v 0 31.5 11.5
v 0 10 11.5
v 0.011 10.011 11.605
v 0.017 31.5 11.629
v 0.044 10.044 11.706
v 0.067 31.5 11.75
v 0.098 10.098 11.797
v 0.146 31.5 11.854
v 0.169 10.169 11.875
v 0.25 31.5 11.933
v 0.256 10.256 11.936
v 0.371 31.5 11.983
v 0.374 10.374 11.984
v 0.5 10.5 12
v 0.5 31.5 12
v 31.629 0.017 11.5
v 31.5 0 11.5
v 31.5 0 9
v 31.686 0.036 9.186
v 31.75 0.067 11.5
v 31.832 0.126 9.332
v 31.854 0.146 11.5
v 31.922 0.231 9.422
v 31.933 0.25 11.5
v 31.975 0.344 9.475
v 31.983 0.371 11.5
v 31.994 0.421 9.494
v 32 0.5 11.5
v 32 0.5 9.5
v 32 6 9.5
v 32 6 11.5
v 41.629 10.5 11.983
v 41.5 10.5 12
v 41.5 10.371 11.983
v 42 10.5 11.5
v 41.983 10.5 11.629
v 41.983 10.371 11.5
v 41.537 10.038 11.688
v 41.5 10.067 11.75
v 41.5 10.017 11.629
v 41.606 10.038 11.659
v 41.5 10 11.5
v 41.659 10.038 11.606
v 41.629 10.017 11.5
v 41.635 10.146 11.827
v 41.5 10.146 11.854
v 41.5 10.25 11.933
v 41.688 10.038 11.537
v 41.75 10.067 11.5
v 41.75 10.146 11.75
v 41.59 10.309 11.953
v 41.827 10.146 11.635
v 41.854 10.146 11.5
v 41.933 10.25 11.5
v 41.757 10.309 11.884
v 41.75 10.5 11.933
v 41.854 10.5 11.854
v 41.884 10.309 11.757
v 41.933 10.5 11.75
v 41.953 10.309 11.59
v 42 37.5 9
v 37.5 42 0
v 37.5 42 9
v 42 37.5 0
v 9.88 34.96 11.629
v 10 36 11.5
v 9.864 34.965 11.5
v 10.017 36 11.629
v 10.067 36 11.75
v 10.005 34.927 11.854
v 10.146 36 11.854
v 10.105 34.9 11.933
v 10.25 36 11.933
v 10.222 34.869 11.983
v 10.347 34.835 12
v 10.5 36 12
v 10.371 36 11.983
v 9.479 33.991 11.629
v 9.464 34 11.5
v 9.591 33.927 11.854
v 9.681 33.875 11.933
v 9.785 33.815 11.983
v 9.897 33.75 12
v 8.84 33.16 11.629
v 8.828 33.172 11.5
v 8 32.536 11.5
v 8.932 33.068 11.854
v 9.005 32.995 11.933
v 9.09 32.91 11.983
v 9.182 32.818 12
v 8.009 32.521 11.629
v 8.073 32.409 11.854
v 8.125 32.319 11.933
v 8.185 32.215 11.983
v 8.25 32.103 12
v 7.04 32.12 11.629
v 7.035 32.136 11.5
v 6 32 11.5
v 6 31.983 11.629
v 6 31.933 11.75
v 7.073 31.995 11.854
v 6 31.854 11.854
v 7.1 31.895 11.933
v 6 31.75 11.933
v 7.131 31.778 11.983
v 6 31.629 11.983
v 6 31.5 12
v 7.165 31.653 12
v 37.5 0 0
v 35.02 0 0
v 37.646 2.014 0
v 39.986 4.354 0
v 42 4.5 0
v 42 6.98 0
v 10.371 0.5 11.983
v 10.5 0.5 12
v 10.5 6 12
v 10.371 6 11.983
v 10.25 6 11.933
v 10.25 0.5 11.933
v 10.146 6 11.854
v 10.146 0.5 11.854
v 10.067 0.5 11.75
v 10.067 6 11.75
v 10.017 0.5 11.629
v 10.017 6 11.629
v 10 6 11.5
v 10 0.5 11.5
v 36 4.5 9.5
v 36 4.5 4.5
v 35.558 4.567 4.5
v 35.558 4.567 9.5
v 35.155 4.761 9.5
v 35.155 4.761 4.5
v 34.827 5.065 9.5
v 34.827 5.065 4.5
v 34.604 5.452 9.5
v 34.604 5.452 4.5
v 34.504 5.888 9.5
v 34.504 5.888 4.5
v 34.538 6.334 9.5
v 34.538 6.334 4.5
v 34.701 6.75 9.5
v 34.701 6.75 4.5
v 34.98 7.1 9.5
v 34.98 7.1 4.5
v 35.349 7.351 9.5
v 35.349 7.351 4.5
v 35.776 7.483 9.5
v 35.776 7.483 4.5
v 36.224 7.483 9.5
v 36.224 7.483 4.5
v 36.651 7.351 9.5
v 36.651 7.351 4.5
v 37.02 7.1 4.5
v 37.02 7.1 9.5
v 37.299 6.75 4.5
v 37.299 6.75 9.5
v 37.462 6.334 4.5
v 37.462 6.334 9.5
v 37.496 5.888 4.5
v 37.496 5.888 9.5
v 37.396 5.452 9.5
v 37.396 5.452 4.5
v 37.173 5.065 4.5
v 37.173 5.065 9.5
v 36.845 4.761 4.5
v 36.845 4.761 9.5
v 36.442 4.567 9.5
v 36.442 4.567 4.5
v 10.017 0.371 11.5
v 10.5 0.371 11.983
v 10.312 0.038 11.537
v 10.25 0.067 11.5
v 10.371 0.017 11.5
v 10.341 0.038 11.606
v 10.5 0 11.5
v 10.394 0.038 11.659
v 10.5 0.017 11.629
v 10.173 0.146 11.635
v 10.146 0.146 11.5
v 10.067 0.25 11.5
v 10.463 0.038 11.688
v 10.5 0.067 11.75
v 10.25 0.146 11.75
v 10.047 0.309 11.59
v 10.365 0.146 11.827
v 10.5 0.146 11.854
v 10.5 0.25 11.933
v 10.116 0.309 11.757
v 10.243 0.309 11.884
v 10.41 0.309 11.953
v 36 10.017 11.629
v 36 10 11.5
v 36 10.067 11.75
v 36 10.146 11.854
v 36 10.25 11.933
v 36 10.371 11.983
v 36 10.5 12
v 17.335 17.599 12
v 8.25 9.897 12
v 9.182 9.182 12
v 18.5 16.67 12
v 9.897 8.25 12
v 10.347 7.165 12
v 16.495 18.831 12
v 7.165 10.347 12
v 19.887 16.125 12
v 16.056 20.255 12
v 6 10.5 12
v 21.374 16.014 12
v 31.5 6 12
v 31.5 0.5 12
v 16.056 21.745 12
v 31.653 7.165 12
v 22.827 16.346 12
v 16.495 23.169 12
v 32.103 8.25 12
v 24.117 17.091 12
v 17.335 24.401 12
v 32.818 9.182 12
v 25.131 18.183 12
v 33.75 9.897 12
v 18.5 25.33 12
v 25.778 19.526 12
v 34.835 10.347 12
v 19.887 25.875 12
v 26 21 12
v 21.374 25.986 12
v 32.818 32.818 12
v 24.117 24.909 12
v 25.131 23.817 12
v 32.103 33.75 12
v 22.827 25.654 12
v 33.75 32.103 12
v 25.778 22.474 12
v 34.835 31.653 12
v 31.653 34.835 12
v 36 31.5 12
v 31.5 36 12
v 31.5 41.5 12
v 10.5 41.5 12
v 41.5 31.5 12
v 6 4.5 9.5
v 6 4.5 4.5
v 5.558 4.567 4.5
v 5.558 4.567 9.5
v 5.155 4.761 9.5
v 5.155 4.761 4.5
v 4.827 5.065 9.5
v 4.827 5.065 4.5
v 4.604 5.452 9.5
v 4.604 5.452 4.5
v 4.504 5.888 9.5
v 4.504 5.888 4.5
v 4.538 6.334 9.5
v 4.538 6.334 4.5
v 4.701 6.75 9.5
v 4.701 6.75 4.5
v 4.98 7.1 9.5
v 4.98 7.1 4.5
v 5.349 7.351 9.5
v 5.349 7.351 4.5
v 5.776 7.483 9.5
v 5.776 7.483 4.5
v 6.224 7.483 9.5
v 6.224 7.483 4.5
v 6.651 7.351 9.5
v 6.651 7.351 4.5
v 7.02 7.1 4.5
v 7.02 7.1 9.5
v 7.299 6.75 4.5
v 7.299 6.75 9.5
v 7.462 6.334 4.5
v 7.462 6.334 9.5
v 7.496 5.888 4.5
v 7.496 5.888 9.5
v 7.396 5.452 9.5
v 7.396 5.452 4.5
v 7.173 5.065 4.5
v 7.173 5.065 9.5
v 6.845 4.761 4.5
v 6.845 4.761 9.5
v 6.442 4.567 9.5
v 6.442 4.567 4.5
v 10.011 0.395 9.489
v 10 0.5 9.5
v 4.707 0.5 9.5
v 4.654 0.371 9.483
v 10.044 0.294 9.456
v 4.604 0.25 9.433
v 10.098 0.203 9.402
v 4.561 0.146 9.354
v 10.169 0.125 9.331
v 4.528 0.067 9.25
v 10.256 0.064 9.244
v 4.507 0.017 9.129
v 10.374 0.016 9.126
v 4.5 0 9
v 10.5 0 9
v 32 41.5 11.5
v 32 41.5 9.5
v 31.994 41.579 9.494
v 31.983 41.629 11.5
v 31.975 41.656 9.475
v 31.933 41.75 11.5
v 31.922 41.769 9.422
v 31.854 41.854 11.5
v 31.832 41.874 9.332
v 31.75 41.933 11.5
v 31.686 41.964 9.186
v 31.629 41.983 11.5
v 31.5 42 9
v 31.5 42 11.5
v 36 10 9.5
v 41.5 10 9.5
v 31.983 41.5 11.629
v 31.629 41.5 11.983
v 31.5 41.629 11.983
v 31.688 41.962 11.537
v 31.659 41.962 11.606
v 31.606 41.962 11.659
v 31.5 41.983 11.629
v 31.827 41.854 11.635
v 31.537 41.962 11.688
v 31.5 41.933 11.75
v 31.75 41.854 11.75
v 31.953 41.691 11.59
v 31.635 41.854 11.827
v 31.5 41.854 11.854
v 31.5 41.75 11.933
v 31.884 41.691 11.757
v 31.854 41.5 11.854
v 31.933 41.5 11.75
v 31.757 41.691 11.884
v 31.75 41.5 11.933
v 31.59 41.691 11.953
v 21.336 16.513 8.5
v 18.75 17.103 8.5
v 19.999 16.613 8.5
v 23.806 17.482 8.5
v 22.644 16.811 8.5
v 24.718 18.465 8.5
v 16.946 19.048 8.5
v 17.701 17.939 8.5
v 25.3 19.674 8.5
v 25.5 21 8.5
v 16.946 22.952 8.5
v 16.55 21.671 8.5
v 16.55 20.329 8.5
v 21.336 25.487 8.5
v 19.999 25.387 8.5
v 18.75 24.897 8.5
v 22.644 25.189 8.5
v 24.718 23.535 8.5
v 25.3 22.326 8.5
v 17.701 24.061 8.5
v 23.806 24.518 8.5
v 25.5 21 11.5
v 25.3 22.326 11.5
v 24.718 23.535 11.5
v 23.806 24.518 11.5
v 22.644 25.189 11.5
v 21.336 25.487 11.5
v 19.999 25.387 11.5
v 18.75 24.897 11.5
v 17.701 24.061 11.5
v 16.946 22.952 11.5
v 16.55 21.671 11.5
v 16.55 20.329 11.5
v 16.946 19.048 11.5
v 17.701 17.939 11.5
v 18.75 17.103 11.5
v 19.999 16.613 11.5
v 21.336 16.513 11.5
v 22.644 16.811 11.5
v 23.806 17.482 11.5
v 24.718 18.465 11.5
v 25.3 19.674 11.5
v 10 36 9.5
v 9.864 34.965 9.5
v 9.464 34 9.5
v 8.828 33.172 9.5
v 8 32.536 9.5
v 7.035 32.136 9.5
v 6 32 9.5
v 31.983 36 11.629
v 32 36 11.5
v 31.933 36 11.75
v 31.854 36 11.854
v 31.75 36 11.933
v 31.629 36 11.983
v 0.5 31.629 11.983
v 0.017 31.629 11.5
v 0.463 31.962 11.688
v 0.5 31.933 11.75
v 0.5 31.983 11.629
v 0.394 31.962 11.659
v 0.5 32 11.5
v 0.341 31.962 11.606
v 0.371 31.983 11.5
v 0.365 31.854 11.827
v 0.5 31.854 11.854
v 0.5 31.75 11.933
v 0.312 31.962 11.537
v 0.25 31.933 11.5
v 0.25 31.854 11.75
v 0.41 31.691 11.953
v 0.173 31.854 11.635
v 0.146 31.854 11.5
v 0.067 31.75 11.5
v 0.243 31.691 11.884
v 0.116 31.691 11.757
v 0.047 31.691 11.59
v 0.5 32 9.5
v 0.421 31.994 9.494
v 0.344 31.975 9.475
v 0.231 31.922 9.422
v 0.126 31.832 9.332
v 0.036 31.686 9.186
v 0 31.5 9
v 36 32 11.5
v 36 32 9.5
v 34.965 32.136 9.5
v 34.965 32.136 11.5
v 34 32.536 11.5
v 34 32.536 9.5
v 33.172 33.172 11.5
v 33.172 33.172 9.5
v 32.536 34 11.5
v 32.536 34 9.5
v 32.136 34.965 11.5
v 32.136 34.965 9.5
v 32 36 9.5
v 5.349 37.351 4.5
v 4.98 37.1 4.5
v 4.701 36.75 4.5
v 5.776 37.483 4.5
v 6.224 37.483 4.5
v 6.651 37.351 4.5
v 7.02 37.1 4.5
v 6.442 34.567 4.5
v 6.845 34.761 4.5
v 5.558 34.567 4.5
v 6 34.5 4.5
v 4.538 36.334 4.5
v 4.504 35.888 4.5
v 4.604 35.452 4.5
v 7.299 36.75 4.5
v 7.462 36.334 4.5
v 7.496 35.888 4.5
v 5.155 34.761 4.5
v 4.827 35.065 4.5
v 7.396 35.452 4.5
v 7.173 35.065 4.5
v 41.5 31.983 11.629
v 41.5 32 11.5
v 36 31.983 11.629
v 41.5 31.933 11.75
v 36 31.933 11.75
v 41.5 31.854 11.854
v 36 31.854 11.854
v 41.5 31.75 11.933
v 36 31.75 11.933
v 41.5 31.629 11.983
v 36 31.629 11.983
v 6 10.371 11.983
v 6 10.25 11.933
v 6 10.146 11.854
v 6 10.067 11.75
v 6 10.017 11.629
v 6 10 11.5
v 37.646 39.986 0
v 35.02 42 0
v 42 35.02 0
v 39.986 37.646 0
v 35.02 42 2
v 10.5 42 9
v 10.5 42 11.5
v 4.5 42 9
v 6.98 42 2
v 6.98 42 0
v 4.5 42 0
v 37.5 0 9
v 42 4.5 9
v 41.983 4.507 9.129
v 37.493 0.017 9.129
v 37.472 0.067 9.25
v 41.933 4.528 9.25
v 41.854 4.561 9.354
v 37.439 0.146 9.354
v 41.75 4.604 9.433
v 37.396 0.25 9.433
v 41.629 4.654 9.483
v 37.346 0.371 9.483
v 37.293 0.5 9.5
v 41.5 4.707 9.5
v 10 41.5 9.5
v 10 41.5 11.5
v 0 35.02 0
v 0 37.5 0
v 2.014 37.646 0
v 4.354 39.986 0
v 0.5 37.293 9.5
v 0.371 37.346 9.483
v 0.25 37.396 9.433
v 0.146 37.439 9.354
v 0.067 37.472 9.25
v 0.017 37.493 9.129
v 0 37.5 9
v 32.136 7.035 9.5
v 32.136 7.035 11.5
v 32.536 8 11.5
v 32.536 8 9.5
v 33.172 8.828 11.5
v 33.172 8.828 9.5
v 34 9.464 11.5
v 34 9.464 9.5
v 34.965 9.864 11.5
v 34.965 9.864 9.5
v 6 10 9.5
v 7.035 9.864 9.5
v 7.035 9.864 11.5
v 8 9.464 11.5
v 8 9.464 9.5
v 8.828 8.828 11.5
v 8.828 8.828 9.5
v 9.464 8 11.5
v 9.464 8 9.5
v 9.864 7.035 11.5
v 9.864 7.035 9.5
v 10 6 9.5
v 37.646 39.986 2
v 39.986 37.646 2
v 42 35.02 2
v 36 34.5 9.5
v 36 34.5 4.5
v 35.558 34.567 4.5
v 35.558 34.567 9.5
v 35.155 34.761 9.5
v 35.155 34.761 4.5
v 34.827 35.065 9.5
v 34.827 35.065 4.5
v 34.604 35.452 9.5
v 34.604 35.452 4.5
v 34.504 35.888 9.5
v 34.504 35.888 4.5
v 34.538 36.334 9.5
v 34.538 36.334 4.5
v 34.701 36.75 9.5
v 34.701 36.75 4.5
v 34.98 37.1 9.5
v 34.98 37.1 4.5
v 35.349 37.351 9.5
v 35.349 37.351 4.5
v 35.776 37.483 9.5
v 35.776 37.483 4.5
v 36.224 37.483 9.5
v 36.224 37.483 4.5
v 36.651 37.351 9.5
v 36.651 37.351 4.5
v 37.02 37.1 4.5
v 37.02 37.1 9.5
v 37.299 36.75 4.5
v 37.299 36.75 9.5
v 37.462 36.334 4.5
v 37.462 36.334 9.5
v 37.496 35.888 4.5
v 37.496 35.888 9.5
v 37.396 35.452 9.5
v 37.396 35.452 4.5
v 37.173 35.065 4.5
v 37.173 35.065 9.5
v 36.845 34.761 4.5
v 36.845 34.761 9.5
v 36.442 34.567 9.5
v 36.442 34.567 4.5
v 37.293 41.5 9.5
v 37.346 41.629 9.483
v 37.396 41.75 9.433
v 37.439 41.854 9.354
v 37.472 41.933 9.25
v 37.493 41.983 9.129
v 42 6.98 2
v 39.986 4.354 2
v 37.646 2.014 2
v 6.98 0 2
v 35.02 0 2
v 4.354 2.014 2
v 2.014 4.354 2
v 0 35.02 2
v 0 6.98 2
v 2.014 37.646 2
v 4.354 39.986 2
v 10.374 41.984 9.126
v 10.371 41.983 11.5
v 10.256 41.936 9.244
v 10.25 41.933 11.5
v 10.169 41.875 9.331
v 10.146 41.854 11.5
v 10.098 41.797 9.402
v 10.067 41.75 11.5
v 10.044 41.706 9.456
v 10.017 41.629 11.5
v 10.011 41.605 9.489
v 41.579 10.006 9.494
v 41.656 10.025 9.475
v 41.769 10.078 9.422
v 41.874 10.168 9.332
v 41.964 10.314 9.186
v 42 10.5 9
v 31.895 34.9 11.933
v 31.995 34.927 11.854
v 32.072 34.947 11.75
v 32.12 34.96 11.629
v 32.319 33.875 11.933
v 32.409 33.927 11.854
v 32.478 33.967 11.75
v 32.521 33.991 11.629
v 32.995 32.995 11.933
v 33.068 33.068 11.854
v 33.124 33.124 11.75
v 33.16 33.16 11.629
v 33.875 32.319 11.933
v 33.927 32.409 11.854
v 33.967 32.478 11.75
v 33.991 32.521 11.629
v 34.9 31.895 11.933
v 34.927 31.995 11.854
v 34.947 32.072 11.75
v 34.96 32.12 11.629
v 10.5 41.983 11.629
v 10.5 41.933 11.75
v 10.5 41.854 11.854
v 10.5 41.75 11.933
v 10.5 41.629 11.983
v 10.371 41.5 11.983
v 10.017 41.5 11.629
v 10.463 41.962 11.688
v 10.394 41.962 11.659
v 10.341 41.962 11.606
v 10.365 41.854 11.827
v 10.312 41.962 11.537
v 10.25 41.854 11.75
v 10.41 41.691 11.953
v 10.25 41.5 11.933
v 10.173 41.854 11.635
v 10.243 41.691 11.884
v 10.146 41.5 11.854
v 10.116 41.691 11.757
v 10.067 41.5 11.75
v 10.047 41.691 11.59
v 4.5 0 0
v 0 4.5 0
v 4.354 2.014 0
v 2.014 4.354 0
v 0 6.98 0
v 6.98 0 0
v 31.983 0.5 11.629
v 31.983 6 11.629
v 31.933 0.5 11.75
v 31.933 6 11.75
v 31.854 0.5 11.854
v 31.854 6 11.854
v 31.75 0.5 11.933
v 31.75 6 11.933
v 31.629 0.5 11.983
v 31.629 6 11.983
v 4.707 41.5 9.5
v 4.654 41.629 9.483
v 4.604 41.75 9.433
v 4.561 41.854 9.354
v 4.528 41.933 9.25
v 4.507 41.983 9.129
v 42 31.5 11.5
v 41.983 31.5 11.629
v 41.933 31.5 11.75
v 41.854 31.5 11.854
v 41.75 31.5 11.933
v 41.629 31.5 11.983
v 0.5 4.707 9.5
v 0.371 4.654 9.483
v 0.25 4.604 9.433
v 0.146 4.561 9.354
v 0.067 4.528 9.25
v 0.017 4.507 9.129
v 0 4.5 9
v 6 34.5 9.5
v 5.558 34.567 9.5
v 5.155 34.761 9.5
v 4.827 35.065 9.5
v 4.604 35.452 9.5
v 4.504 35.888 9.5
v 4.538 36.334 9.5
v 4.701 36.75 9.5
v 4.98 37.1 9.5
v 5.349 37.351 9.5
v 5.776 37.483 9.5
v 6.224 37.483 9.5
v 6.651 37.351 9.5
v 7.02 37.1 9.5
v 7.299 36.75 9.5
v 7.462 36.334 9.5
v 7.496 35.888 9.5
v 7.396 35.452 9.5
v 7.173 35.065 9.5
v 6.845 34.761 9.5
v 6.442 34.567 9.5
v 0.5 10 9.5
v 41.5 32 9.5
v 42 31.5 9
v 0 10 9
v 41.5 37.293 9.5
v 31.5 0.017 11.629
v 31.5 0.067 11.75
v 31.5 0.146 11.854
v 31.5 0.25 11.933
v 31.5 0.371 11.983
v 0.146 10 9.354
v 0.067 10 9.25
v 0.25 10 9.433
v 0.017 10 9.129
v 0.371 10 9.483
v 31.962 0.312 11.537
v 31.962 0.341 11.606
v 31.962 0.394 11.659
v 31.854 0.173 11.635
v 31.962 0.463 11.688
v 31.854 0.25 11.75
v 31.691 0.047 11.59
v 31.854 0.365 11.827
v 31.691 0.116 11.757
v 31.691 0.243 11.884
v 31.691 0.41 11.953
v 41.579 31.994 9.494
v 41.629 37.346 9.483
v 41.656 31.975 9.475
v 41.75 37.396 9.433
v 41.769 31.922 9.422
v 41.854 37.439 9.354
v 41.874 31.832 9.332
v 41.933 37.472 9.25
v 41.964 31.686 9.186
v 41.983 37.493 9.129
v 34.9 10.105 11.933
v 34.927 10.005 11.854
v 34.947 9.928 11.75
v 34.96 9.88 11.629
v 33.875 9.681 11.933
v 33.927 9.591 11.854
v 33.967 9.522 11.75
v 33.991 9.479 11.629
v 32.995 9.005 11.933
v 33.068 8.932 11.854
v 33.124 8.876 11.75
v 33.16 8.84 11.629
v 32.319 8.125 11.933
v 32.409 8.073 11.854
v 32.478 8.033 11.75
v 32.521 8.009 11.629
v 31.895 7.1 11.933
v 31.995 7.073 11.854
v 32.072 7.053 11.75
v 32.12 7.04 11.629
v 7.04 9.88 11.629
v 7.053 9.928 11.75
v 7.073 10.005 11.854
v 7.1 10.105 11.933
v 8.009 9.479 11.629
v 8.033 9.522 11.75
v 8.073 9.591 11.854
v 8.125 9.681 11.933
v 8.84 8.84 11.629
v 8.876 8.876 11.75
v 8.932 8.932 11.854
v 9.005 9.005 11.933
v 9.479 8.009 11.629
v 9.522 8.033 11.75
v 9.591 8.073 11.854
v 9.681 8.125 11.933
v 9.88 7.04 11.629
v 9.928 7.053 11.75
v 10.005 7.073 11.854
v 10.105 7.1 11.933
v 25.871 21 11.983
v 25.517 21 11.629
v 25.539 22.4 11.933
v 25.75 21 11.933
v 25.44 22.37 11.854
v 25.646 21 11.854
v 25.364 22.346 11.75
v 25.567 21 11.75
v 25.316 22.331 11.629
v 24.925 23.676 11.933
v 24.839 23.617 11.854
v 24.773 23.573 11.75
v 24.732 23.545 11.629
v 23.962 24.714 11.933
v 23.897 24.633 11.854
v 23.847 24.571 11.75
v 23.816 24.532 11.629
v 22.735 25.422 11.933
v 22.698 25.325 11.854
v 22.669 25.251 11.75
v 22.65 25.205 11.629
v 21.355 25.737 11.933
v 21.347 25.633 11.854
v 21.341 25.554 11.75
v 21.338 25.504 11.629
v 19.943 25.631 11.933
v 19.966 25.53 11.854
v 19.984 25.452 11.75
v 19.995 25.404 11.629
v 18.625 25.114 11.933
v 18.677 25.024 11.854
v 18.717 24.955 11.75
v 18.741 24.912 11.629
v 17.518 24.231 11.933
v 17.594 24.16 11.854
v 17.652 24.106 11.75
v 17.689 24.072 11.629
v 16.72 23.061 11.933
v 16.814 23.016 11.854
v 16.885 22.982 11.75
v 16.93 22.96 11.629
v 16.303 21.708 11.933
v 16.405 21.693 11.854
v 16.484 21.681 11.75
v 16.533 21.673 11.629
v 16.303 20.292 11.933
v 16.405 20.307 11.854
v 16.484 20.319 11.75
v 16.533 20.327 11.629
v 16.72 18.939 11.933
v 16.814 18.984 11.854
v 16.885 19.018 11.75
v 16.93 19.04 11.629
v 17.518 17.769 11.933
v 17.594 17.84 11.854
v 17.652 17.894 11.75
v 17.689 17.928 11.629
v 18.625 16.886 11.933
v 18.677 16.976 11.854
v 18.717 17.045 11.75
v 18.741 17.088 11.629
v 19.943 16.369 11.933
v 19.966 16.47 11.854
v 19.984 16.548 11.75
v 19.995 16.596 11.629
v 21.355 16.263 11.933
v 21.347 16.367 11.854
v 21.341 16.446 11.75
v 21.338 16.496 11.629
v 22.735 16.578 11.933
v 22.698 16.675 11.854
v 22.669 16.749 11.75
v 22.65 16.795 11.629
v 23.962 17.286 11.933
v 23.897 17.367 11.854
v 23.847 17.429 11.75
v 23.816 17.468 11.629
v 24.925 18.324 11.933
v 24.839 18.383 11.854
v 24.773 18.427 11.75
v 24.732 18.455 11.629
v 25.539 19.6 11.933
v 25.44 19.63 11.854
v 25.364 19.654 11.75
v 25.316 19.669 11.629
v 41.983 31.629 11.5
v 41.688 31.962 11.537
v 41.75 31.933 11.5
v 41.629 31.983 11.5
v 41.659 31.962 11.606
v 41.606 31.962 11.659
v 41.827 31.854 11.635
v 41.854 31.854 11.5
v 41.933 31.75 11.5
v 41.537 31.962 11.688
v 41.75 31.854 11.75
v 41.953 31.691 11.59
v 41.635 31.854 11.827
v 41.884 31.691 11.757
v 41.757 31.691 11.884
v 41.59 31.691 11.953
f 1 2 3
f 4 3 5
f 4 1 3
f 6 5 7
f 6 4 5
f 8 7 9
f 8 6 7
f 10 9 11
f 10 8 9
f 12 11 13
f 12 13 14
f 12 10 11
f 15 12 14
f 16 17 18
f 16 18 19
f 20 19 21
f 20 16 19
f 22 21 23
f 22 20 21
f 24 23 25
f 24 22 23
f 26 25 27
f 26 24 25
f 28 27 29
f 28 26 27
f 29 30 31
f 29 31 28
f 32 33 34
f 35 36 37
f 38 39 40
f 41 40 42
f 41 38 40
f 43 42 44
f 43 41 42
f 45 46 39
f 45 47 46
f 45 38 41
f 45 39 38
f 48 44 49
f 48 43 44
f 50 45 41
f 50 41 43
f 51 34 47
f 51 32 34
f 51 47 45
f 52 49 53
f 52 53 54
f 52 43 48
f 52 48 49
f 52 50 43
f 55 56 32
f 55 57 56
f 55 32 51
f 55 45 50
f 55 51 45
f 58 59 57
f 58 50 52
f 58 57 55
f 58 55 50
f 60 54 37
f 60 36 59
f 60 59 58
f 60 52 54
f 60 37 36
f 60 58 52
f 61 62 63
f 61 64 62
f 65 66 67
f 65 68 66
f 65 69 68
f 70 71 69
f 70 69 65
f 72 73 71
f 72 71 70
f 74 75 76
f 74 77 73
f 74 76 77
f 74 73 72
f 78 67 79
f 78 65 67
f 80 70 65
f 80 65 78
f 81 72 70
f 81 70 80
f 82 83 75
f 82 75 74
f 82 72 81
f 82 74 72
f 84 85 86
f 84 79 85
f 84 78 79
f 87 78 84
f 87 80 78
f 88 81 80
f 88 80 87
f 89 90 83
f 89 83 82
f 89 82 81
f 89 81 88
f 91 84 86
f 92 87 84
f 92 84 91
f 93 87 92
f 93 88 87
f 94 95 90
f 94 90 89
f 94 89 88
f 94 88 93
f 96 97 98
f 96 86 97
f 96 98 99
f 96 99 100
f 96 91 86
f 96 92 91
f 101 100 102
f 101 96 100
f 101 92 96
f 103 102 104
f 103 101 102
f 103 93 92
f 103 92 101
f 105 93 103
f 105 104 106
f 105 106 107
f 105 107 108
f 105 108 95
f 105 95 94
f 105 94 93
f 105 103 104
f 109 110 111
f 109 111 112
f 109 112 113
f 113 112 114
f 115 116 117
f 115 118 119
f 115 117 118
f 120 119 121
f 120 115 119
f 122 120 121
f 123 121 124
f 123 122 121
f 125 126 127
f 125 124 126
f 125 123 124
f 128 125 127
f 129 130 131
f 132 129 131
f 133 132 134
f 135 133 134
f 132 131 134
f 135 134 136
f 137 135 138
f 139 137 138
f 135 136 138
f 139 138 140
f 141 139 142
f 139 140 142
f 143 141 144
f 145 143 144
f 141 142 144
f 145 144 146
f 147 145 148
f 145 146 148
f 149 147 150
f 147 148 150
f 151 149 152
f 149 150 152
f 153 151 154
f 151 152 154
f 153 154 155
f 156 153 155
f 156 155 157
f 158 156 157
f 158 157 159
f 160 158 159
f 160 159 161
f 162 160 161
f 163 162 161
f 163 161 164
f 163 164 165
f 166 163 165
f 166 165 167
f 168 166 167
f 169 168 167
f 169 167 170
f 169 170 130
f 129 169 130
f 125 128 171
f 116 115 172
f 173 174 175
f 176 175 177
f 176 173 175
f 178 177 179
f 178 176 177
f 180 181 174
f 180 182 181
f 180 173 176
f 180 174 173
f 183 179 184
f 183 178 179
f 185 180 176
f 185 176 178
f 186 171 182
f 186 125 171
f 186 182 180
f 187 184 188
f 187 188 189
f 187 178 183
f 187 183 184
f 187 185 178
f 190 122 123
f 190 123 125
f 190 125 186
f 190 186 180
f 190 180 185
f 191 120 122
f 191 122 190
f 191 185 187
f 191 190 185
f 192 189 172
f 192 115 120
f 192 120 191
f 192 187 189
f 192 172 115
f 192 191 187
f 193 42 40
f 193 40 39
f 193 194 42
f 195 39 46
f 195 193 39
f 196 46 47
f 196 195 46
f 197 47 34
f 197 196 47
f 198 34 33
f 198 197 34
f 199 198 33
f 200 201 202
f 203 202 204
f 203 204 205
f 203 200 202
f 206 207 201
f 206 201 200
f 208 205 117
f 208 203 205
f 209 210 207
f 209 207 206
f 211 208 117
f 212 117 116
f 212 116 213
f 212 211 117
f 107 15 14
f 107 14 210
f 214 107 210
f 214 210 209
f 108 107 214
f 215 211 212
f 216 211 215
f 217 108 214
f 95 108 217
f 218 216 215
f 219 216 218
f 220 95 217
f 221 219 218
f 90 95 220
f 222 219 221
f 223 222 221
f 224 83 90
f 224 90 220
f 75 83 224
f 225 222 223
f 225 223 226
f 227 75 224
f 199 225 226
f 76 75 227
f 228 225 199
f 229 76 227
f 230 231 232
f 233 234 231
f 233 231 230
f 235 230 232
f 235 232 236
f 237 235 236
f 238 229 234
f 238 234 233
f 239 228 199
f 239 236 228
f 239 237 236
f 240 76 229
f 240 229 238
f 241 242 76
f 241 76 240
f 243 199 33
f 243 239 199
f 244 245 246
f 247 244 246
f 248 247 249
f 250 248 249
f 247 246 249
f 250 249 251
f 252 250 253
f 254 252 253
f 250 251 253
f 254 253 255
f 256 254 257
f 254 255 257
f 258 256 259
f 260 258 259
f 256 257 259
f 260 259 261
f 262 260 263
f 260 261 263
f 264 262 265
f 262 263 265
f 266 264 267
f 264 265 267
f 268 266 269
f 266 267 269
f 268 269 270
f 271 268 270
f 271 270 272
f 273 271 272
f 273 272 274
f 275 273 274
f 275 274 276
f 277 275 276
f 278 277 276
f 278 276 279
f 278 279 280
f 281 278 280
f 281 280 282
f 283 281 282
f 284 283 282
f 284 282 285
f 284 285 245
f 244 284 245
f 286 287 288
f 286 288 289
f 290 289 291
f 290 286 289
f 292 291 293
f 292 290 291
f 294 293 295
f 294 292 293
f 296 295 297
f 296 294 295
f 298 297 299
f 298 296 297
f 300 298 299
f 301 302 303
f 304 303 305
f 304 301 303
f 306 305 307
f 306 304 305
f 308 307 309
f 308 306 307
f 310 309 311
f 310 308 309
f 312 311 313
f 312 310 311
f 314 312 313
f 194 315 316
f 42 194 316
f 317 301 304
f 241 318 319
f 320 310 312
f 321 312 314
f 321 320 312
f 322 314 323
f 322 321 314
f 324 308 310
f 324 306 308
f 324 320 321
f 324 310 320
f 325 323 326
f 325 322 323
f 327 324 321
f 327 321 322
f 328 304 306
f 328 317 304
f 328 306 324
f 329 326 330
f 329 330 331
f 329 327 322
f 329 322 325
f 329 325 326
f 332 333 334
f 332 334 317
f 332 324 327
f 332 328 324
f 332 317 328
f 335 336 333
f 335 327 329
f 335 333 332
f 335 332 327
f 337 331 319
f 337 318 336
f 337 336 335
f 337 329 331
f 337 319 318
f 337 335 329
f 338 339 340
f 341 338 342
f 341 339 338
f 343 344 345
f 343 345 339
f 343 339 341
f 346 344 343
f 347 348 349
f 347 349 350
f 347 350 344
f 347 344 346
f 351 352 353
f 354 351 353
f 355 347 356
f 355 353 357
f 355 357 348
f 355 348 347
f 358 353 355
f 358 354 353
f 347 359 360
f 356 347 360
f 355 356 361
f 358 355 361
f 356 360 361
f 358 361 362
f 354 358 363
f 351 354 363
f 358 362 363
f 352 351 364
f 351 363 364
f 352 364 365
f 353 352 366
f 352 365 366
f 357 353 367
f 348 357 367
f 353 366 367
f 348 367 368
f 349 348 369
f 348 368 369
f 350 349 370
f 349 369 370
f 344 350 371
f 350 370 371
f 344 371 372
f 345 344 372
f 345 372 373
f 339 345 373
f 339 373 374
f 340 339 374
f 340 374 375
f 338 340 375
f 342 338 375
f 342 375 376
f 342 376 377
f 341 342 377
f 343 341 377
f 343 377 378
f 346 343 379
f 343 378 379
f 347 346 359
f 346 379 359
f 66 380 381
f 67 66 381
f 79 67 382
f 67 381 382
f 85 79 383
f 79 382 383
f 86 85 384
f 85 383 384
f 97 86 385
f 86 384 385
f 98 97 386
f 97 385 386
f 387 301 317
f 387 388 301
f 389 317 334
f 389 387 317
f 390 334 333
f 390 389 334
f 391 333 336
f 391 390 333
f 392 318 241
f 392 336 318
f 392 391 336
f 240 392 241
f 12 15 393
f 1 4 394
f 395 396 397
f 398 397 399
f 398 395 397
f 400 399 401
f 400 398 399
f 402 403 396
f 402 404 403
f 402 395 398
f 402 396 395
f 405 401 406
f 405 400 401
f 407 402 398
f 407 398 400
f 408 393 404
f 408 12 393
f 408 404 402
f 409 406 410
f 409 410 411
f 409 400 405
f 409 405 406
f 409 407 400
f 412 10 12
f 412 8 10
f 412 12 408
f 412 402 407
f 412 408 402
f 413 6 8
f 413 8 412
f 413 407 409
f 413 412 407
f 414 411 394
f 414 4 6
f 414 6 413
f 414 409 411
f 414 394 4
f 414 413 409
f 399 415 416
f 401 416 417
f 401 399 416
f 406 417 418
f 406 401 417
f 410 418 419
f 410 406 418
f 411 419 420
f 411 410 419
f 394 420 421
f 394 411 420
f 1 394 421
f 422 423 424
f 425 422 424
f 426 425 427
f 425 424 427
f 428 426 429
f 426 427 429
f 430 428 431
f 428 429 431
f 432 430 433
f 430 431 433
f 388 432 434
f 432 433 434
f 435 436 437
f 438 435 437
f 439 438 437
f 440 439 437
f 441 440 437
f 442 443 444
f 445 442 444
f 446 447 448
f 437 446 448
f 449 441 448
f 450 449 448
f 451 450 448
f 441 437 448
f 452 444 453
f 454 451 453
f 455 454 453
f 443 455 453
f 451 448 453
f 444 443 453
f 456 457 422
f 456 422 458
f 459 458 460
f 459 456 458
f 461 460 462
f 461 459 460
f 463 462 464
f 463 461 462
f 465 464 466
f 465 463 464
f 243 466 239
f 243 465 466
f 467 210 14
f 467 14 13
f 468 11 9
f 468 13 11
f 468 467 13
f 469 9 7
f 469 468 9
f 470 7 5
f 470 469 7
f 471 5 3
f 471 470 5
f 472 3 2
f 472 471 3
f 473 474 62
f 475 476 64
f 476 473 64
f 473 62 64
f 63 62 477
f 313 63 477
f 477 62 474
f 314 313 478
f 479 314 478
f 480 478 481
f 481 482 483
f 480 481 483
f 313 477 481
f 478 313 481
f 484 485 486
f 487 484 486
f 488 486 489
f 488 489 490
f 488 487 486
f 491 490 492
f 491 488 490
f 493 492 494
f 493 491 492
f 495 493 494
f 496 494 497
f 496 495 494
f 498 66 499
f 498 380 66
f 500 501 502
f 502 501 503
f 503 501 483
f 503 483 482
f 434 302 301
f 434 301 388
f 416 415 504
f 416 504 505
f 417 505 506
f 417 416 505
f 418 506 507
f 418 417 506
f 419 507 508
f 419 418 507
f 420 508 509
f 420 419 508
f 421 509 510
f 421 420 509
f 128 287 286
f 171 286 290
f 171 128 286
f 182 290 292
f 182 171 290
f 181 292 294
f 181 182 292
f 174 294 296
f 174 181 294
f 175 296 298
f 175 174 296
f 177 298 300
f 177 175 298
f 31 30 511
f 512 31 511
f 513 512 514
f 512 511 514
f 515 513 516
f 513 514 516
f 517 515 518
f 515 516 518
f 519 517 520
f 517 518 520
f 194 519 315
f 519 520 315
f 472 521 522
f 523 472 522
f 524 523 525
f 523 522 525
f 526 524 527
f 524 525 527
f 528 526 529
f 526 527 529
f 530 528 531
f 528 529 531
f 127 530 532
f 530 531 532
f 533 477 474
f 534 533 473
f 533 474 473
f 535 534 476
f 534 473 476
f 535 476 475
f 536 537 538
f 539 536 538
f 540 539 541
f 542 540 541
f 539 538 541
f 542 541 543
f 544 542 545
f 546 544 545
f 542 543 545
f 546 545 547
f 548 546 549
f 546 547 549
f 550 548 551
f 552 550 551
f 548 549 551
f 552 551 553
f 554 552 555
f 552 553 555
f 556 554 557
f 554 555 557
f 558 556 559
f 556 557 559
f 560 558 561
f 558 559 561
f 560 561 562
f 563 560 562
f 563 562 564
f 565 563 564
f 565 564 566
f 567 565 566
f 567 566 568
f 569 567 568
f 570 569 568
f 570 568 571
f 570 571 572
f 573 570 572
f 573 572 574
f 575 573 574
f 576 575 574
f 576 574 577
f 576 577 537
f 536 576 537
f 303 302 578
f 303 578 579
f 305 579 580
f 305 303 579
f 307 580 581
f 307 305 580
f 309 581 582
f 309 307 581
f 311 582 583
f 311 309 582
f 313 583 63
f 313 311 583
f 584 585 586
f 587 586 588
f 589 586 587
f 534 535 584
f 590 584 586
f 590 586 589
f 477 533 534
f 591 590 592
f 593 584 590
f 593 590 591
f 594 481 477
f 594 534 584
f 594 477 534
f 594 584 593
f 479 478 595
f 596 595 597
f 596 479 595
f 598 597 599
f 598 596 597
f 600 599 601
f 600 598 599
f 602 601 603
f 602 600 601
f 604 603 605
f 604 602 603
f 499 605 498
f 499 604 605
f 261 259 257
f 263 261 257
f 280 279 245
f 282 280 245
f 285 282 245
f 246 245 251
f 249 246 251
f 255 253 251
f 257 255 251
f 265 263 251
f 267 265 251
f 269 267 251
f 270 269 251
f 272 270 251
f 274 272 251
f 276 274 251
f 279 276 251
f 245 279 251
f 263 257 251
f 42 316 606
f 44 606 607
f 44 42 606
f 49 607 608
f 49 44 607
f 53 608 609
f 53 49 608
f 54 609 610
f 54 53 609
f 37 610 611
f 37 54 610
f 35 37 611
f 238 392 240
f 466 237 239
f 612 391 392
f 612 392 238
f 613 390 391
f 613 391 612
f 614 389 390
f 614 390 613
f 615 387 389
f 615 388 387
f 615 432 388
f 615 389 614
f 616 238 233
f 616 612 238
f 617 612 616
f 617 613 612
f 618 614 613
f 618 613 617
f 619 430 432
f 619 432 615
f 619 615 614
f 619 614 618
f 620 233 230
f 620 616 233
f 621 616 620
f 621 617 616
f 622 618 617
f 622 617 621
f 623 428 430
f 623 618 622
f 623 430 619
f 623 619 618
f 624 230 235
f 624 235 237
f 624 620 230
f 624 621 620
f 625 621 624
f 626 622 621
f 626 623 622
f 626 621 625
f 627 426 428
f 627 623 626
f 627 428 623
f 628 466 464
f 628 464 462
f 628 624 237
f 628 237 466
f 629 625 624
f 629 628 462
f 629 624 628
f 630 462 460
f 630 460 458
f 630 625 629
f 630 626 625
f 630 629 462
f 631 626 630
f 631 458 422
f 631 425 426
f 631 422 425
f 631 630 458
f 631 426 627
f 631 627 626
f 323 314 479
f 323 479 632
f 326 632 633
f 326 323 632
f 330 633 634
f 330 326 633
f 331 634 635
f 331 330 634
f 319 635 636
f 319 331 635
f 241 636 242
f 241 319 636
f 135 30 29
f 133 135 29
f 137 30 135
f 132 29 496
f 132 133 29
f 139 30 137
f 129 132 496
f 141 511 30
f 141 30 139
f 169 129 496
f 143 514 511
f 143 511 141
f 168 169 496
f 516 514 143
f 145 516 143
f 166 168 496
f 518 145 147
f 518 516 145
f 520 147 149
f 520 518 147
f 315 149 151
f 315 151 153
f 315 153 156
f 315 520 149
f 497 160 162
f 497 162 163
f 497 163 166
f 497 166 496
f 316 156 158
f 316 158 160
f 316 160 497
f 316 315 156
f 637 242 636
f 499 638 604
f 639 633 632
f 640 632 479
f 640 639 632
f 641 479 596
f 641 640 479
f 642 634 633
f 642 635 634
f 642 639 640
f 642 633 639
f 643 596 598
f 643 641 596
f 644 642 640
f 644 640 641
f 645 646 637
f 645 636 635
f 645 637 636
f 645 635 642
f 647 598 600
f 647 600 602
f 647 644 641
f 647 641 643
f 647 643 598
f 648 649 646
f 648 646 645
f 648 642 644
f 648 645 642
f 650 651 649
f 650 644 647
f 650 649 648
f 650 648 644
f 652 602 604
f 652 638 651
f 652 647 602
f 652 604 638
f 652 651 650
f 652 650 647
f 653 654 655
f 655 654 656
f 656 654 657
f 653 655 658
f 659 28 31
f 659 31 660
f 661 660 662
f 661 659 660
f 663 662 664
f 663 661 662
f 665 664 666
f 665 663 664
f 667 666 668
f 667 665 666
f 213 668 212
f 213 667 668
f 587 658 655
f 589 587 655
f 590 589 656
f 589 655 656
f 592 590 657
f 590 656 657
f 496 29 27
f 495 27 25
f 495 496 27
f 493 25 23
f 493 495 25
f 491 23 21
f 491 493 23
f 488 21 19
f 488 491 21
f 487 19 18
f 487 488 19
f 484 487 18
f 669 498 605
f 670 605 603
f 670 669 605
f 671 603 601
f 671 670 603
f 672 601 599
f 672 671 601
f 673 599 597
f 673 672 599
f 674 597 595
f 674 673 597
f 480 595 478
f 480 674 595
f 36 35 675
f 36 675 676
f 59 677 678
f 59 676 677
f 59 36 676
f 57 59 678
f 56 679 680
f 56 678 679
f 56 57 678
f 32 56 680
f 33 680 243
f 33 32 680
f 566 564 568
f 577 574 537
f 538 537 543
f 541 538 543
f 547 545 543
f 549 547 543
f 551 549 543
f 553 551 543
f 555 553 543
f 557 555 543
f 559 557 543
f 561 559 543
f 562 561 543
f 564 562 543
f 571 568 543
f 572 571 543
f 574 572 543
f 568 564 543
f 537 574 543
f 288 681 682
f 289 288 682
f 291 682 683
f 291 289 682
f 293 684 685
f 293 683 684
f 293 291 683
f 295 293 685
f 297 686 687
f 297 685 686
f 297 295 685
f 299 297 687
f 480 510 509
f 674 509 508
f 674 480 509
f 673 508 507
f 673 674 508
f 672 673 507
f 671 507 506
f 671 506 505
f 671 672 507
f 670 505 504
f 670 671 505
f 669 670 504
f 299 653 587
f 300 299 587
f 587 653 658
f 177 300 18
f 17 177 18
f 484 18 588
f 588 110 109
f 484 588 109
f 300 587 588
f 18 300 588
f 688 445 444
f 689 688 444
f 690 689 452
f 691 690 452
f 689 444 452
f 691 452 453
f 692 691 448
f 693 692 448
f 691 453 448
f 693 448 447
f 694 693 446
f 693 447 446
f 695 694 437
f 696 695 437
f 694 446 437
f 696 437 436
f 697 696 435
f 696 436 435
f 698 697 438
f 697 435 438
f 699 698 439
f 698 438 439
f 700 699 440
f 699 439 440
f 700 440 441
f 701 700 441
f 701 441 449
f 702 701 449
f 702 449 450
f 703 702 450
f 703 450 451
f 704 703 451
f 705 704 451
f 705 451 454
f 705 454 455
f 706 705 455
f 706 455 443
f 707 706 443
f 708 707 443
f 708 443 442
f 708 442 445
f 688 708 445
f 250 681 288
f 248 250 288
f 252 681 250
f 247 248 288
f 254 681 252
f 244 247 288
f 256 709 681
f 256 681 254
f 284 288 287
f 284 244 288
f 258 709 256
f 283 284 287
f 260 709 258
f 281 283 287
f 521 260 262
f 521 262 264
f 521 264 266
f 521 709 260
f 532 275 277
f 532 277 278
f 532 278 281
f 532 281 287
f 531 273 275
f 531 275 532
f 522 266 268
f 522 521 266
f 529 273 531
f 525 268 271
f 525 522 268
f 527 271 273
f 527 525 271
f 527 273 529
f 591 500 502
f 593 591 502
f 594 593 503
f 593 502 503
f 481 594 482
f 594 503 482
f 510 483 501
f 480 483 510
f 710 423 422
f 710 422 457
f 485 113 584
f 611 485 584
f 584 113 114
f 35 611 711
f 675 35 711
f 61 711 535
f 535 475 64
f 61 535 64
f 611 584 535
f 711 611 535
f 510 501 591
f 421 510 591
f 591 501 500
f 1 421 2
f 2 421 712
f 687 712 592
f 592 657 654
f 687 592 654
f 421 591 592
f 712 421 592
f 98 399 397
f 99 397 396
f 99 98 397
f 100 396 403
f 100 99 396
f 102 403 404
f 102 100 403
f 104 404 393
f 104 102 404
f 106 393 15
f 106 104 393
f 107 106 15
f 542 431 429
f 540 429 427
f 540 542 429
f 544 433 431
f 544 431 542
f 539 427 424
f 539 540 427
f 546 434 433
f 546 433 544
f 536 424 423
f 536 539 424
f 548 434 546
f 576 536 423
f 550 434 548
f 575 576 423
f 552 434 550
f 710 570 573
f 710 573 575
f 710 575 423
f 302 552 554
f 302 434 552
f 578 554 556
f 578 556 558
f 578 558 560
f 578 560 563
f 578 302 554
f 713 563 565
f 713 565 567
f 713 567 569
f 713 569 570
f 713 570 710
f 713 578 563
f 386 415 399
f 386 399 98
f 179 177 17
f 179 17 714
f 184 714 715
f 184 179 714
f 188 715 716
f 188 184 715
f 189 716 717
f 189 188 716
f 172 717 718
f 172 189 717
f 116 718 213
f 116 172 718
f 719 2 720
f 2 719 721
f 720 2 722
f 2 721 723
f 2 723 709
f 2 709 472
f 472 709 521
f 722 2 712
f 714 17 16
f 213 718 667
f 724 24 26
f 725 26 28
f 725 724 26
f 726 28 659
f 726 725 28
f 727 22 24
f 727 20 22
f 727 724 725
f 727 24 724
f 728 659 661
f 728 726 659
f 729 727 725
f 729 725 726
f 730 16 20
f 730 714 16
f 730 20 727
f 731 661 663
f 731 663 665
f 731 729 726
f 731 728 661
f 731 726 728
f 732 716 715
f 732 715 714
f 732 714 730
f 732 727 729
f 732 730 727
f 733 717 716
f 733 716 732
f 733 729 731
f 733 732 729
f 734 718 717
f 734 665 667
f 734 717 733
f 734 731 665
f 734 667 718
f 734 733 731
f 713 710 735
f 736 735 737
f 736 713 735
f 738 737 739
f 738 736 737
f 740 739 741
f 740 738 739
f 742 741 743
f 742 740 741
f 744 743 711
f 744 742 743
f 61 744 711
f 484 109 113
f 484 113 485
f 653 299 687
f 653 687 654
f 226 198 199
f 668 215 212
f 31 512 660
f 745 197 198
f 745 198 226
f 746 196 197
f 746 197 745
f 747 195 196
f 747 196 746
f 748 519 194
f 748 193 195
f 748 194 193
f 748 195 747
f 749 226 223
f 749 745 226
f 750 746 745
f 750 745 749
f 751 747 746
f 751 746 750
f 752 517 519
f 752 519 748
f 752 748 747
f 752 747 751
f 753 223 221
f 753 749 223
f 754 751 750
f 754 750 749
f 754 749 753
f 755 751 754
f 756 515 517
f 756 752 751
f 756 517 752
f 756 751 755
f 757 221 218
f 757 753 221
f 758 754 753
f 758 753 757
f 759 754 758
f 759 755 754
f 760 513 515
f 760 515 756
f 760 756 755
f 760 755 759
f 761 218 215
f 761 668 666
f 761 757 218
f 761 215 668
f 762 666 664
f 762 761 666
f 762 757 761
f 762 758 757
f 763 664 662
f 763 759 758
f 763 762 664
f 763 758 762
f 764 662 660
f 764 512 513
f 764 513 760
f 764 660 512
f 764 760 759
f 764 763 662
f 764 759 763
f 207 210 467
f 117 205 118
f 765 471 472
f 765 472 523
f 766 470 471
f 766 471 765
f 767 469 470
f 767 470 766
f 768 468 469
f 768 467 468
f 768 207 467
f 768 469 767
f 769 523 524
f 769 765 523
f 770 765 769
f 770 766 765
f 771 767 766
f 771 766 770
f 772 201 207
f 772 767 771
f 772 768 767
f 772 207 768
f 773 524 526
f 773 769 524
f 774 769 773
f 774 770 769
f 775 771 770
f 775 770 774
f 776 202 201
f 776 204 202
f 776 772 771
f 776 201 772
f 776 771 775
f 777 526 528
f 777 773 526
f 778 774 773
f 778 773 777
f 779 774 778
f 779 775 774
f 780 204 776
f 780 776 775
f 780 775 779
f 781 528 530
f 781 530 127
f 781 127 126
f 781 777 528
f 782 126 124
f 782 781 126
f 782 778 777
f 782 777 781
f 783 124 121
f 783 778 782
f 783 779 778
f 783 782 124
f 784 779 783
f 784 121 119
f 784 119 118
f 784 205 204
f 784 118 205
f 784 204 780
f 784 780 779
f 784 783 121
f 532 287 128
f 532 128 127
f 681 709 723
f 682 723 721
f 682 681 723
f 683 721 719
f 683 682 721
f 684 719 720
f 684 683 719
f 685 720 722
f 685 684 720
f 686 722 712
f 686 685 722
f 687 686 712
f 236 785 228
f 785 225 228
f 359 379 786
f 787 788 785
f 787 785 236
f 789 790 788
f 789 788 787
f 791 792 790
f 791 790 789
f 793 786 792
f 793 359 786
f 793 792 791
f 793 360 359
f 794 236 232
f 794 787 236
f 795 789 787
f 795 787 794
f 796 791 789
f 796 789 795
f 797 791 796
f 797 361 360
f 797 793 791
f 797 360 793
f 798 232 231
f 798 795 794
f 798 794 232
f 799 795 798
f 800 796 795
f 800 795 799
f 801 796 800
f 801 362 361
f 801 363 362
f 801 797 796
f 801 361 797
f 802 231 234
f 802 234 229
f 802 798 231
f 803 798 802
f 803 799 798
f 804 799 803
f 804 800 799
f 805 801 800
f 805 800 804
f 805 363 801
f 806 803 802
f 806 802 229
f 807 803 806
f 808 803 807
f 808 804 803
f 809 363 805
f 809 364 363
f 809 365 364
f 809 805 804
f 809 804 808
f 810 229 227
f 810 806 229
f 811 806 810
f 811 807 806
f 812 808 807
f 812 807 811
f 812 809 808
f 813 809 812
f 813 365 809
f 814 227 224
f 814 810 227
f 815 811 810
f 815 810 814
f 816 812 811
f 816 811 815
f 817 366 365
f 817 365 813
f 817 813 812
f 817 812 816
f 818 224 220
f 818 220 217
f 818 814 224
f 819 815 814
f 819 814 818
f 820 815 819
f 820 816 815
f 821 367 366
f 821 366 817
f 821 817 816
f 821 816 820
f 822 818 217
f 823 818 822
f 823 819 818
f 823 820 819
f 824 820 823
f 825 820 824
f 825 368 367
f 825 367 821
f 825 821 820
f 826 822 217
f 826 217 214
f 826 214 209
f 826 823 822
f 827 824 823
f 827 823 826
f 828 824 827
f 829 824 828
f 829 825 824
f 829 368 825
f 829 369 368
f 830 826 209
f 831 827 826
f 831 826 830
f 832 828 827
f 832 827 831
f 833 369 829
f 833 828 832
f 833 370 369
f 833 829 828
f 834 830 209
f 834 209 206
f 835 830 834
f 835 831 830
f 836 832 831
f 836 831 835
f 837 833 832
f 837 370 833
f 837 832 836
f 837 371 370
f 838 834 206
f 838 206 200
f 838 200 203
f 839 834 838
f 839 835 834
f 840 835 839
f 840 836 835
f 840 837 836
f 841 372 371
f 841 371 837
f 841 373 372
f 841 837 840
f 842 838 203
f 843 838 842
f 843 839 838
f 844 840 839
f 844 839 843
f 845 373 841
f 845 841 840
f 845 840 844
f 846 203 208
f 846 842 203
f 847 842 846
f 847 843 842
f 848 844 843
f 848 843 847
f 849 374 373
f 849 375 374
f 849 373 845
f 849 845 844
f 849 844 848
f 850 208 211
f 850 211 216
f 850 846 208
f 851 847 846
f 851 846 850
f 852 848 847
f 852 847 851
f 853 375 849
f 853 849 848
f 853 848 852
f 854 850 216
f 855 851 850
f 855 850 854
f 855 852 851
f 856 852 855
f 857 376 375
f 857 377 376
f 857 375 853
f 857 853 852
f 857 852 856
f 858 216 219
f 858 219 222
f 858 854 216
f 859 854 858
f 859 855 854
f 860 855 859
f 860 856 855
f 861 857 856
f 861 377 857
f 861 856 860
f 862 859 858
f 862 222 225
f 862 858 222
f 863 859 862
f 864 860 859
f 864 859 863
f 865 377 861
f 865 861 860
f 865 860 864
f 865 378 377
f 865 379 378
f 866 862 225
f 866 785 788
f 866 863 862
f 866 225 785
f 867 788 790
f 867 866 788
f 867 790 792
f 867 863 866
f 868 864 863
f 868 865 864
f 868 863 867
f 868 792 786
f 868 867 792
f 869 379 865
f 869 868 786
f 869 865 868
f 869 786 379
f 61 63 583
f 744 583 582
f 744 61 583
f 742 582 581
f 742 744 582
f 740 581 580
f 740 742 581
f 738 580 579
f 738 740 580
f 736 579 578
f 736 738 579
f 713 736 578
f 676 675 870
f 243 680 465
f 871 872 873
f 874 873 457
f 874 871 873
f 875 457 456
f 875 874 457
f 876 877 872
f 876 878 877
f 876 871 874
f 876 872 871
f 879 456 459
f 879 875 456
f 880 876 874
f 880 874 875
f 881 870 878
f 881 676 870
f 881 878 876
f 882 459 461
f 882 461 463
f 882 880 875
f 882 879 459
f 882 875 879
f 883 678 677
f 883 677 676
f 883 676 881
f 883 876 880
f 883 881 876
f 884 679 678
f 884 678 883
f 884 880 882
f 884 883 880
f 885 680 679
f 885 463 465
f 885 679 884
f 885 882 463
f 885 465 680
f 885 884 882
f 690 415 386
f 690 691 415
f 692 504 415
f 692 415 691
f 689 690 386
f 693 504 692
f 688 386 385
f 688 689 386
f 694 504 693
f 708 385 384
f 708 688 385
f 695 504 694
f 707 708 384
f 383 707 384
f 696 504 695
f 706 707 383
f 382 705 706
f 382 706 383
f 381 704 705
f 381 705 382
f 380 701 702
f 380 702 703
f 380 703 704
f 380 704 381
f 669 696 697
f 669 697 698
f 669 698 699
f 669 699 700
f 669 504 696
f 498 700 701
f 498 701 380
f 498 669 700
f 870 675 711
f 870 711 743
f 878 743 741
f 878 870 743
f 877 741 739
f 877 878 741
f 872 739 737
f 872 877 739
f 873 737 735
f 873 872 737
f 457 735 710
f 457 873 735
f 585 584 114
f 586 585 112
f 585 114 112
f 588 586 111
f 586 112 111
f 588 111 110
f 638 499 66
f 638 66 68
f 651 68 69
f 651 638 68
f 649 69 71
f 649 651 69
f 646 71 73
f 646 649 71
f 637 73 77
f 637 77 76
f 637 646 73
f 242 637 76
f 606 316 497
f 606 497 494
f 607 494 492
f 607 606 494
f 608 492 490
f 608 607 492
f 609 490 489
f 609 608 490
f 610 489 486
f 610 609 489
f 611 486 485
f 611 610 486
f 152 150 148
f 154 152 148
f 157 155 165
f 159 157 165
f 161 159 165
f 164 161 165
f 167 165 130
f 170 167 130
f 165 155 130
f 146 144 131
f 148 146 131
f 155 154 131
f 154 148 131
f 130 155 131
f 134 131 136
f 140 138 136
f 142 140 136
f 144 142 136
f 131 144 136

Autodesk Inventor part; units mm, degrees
ref_plane "YZ Plane" through (0, 0, 0) normal (1, 0, 0) x (0, 1, 0)
ref_plane "XZ Plane" through (0, 0, 0) normal (0, 1, 0) x (-1, 0, 0)
ref_plane "XY Plane" through (0, 0, 0) normal (0, 0, 1) x (1, 0, 0)
sketch "Sketch1" plane through (0, 0, 0) normal (0, 0, 1) x (1, 0, 0)
  line L0 (0, 0) -> (42, 0)
  line L1 (42, 0) -> (42, 42)
  line L2 (42, 42) -> (0, 42)
  line L3 (0, 42) -> (0, 0)
  dimension "d0" = 42
  dimension "d1" = 42
extrude "Extrusion1" add sketch "Sketch1" along normal blind 9.5
chamfer "Chamfer1" distance 4.5 angle 45 4 edges at (0, 0, 4.75) (42, 0, 4.75) (42, 42, 4.75) (0, 42, 4.75)
sketch "Sketch6" plane through (0, 0, 0) normal (0, 0, -1) x (-1, 0, 0)
  line L0 (-42, 4.5) -> (-42, 37.5) projected
  line L1 (-4.5, 0) -> (-37.5, 0) projected
  circle A0 centre (-21, 21) radius 25.25
  dimension "d37" = 50.5
  dimension "d38" = 21
  dimension "d39" = 21
extrude "Extrusion5" cut sketch "Sketch6" against normal blind 2
sketch "Sketch2" plane through (0, 0, 9.5) normal (0, 0, 1) x (1, 0, 0)
  line L0 (4.5, 42) -> (37.5, 42) projected
  line L1 (0, 4.5) -> (0, 37.5) projected
  line L2 (37.5, 0) -> (4.5, 0) projected
  line L3 (42, 37.5) -> (42, 4.5) projected
  line L4 (10, 0) -> (10, 6)
  line L5 (10, 36) -> (10, 42)
  line L6 (0, 32) -> (6, 32)
  line L7 (36, 32) -> (42, 32)
  line L8 (0, 10) -> (6, 10)
  line L9 (36, 10) -> (42, 10)
  line L10 (32, 42) -> (32, 36)
  line L11 (32, 6) -> (32, 0)
  arc A0 (6, 32) -> (10, 36) centre (6, 36) ccw
  arc A1 (32, 36) -> (36, 32) centre (36, 36) ccw
  arc A2 (36, 10) -> (32, 6) centre (36, 6) ccw
  arc A3 (10, 6) -> (6, 10) centre (6, 6) ccw
  dimension "d10" = 4
extrude "Extrusion6" add sketch "Sketch2" along normal blind 2.5
fillet "Fillet3" radius 0.5 35 edges at (2.25, 2.25, 9.5) (7.25, 0, 9.5) (0, 7.25, 9.5) (34.75, 0, 9.5) (39.75, 2.25, 9.5) (42, 7.25, 9.5) (42, 34.75, 9.5) (34.75, 42, 9.5) (39.75, 39.75, 9.5) (0, 34.75, 9.5) (2.25, 39.75, 9.5) (7.25, 42, 9.5) (0, 21, 12) (42, 21, 12) (3, 10, 12) (8.8284, 8.8284, 12) (10, 3, 12) (21, 0, 12) (32, 3, 12) (33.1716, 8.8284, 12) (39, 10, 12) (33.1716, 33.1716, 12) (39, 32, 12) (32, 39, 12) (8.8284, 33.1716, 12) (10, 39, 12) (3, 32, 12) (21, 42, 12) (10, 0, 10.75) (32, 0, 10.75) (42, 10, 10.75) (42, 32, 10.75) (32, 42, 10.75) (10, 42, 10.75) (0, 32, 10.75)
sketch "Sketch7" plane through (0, 0, 12) normal (0, 0, 1) x (1, 0, 0)
  circle A0 centre (21, 21) radius 4.5
  line L0 (31.5, 42) -> (10.5, 42) projected
  line L1 (0, 31.5) -> (0, 10) projected
  dimension "d45" = 9
  dimension "d46" = 21
  dimension "d47" = 21
extrude "Extrusion7" cut sketch "Sketch7" against normal blind 3.5
fillet "Fillet4" radius 0.5 1 edges at (16.5, 21, 12)
sketch "Sketch8" plane through (0, 0, 9.5) normal (0, 0, 1) x (1, 0, 0)
  arc A0 (10, 6) -> (6, 10) centre (6, 6) ccw projected
  point P0 (36, 6)
  point P1 (6, 36)
  point P2 (36, 36)
  dimension "d51" = 30
  dimension "d52" = 30
hole "Hole2" at (6, 6, 9.5) at (36, 6, 9.5) at (6, 36, 9.5) at (36, 36, 9.5) direction (0, 0, -1) diameter 3 depth 5
properties part number "stepper_front"
